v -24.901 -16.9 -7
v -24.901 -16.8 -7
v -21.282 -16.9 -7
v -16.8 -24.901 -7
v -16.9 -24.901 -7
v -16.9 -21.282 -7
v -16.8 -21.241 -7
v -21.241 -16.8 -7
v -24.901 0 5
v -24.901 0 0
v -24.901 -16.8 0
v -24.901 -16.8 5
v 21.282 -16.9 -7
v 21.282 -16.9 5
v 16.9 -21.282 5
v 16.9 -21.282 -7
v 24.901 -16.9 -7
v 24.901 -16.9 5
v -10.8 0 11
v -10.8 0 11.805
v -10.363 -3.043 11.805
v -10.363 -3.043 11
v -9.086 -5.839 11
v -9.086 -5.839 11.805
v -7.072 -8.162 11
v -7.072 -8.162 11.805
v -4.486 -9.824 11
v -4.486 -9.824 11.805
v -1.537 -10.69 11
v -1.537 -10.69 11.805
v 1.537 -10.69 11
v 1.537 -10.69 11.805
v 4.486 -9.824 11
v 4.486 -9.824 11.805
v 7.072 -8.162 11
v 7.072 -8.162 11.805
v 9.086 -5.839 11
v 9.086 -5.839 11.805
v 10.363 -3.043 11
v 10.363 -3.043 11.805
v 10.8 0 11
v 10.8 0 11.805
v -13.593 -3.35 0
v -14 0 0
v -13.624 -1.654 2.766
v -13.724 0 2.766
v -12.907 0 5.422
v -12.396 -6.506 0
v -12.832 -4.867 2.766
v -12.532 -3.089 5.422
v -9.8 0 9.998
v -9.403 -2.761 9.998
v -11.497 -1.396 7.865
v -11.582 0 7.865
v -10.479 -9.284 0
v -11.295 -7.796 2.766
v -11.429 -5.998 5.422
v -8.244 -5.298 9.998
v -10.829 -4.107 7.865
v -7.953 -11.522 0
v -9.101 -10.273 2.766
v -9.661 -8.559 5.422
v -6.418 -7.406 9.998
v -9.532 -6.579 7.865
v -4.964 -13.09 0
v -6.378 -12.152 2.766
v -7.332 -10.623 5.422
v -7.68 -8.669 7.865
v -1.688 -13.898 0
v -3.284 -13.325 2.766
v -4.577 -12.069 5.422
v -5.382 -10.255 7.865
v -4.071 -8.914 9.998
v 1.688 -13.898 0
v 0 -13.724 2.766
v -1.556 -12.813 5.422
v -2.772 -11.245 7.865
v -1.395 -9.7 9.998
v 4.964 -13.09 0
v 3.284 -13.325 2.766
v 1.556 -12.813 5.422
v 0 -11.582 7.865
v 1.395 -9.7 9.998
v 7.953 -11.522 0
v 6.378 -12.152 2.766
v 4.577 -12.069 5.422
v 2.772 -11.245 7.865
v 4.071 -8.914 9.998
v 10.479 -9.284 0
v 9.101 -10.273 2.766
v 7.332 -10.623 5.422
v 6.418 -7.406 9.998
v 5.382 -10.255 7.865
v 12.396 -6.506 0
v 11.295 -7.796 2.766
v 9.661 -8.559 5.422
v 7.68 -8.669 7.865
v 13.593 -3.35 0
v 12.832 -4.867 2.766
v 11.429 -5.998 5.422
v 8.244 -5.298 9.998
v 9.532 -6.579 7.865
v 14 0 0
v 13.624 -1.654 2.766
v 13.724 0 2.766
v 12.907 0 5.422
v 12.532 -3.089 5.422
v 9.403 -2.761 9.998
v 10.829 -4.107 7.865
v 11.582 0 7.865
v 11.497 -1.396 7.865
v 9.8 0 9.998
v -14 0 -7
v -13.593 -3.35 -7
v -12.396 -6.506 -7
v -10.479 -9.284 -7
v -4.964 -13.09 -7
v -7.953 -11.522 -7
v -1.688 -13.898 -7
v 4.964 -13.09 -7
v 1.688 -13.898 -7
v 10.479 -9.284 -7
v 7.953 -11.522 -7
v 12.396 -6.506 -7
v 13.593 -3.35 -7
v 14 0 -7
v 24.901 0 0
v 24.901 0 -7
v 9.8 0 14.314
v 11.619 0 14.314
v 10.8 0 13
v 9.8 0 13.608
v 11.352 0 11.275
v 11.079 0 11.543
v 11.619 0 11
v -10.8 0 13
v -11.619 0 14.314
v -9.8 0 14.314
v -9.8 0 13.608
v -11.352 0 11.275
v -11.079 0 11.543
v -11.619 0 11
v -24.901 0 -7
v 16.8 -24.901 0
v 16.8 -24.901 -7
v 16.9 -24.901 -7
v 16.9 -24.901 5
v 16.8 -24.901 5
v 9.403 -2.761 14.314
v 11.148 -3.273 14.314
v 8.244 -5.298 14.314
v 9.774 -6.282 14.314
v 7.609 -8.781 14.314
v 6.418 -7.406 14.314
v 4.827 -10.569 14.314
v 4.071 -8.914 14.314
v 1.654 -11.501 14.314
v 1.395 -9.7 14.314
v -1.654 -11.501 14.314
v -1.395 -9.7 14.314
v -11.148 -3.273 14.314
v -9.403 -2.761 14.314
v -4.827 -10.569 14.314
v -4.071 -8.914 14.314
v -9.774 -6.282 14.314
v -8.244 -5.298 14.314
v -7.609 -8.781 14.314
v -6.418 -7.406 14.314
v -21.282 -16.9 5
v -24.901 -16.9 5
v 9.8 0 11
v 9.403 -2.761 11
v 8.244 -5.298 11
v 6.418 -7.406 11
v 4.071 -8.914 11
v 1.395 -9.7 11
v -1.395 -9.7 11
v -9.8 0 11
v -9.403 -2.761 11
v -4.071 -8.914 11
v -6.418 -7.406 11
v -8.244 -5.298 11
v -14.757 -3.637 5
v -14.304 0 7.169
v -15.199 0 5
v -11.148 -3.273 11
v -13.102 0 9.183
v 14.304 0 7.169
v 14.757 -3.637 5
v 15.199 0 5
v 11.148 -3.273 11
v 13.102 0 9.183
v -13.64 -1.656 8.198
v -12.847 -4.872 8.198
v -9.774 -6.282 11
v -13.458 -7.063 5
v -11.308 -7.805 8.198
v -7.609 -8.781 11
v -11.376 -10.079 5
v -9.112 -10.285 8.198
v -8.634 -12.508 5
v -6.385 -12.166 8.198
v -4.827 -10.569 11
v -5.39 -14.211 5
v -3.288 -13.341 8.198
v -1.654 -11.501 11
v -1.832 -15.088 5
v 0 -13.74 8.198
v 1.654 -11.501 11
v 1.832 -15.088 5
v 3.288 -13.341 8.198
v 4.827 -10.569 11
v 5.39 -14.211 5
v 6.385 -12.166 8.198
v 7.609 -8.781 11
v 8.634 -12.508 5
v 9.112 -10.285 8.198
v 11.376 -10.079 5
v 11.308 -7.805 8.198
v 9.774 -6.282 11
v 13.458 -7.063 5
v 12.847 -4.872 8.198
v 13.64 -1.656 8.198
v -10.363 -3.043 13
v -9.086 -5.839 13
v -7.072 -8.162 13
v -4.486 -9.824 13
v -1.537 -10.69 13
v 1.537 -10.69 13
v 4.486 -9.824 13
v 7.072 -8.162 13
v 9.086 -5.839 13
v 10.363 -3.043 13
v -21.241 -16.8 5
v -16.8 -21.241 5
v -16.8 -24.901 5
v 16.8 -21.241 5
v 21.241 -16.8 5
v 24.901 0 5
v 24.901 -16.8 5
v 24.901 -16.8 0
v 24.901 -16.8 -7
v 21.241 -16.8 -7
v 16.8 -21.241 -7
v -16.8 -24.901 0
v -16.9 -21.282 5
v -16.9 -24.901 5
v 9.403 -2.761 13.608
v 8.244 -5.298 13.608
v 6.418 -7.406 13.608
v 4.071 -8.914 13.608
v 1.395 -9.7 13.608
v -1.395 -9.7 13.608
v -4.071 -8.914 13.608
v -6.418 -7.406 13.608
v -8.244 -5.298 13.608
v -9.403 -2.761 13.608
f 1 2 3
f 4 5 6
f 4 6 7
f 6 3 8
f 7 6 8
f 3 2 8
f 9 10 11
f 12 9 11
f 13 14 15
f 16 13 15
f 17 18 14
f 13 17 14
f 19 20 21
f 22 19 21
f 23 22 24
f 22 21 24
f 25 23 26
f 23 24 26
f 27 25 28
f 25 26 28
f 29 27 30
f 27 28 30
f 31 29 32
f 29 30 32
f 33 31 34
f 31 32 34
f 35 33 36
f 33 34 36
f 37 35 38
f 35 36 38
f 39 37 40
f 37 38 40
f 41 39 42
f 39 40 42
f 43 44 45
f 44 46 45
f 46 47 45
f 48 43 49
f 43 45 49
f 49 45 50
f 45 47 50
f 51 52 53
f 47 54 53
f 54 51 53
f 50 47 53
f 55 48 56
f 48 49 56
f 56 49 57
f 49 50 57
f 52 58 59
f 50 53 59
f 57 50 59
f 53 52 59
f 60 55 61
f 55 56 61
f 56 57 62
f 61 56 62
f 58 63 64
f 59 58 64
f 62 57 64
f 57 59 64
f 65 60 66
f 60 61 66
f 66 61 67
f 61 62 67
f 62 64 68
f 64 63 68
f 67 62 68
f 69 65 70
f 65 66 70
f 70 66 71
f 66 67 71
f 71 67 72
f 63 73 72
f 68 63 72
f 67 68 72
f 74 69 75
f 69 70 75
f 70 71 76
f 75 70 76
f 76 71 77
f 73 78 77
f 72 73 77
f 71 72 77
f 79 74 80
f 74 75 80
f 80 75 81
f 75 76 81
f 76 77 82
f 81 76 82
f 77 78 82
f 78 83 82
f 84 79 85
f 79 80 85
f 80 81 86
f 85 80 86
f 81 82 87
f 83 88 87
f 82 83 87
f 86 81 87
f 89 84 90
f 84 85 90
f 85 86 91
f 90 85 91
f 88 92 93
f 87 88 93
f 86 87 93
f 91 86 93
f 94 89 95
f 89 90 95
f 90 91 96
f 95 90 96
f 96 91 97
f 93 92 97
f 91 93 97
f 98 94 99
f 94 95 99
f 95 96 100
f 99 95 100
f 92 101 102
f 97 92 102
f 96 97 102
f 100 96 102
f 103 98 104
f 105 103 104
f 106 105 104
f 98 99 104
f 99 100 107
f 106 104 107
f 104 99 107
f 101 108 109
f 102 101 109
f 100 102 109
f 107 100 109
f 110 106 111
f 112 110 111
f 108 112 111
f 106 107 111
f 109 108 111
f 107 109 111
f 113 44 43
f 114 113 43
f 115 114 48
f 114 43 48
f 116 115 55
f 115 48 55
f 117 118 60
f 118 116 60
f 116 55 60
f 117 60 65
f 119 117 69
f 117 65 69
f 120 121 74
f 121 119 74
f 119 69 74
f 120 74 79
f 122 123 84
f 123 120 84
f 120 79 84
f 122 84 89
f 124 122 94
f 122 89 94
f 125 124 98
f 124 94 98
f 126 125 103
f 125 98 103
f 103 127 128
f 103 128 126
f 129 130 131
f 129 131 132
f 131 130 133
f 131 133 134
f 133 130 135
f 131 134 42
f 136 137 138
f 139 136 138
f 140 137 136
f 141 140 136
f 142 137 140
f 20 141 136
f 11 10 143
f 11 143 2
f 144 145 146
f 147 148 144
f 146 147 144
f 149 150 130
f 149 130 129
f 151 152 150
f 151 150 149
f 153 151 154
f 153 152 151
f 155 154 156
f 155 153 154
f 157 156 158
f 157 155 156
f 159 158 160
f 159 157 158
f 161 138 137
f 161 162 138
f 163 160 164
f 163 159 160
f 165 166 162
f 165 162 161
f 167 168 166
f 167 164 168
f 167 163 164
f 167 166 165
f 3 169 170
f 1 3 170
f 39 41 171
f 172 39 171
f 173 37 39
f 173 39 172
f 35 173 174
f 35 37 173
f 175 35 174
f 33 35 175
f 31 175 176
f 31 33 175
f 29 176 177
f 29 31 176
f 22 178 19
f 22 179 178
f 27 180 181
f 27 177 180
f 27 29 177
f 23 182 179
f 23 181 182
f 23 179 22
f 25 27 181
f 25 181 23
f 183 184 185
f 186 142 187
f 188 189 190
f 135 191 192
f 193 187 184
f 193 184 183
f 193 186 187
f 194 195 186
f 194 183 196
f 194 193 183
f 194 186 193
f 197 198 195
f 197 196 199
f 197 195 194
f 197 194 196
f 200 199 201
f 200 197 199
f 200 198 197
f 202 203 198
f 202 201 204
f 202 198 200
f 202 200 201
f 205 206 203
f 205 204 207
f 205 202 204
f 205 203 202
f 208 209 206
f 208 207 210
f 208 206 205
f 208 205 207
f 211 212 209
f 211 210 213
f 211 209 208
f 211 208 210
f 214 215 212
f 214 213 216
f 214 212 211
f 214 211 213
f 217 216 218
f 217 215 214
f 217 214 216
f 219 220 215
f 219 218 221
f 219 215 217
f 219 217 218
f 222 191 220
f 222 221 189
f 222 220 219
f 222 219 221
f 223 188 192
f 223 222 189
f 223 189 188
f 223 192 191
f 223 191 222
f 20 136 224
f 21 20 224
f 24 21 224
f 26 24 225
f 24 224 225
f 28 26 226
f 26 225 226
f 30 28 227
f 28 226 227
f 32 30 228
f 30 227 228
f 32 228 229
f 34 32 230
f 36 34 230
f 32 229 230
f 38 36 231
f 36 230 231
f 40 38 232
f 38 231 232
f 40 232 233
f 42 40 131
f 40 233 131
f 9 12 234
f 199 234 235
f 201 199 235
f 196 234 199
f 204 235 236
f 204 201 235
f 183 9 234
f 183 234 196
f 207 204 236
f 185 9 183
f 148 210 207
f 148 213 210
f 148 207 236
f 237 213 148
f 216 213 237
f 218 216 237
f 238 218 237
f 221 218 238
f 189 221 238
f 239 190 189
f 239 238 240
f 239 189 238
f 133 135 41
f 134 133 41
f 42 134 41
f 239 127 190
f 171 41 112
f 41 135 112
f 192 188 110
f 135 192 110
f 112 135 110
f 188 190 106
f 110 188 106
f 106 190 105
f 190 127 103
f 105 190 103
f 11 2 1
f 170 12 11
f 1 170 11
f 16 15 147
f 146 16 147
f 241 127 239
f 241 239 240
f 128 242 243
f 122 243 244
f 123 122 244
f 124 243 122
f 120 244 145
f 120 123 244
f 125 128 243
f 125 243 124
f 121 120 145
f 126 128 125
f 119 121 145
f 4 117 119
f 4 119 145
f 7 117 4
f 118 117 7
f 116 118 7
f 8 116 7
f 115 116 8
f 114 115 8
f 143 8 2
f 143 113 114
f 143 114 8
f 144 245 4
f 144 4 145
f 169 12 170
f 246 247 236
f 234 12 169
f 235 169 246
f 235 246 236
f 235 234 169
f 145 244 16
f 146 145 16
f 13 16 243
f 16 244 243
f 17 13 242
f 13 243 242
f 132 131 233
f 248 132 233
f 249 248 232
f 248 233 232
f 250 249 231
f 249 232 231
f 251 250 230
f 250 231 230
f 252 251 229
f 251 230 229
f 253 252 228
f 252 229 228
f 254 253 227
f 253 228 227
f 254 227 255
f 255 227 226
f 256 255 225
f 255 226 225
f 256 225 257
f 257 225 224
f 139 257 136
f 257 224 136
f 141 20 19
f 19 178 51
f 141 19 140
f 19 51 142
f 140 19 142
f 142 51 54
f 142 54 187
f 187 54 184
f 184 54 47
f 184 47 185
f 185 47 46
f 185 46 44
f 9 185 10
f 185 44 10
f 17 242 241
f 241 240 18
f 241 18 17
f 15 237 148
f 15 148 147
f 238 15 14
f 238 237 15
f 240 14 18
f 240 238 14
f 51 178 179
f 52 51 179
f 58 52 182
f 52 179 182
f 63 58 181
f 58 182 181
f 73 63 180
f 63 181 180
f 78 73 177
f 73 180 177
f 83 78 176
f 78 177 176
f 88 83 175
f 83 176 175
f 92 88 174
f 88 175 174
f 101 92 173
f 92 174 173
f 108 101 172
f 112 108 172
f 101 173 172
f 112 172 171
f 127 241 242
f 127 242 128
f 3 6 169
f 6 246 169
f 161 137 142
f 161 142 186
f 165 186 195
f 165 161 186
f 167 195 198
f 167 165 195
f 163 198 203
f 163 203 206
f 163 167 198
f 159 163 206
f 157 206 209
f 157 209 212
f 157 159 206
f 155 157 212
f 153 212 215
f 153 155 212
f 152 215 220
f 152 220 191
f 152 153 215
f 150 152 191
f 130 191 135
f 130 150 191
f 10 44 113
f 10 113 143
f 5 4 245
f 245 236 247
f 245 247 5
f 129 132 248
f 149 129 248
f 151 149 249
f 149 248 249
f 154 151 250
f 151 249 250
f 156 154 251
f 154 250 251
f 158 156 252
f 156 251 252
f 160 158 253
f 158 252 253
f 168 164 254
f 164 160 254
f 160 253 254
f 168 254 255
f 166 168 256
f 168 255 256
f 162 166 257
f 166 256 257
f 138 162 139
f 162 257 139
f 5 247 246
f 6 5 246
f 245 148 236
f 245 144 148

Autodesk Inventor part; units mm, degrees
ref_plane "YZ Plane" through (0, 0, 0) normal (1, 0, 0) x (0, 1, 0)
ref_plane "XZ Plane" through (0, 0, 0) normal (0, 1, 0) x (-1, 0, 0)
sketch "Sketch1" plane through (0, 0, 0) normal (0, 0, 1) x (1, 0, 0)
  line L0 (-36.8533, 0) -> (46.8153, 0) construction
  line L1 (0, -29.8808) -> (0, 4.9801) construction
  line L2 (0, 0) -> (24.6516, -24.6516) construction
  line L3 (0, 0) -> (34.8626, 0) construction
  line L4 (0, -24.9006) -> (16.8, -24.9006)
  line L5 (16.8, -24.9006) -> (16.8, -21.2406)
  line L6 (16.8, -21.2406) -> (19.0203, -19.0203)
  line L7 (24.9006, 0) -> (24.9006, -16.8)
  line L8 (24.9006, -16.8) -> (21.2406, -16.8)
  line L9 (21.2406, -16.8) -> (19.0203, -19.0203)
  line L10 (0, 0) -> (-24.6516, -24.6516) construction
  line L11 (0, -24.9006) -> (-16.8, -24.9006)
  line L12 (-16.8, -24.9006) -> (-16.8, -21.2406)
  line L13 (-16.8, -21.2406) -> (-19.0203, -19.0203)
  line L14 (-24.9006, 0) -> (-24.9006, -16.8)
  line L15 (-24.9006, -16.8) -> (-21.2406, -16.8)
  line L16 (-21.2406, -16.8) -> (-19.0203, -19.0203)
  arc A0 (-14, 0) -> (14, 0) centre (0, 0) ccw
  line L17 (0, 0) -> (14, 0) construction
  line L18 (0, 0) -> (-14, 0) construction
  line L19 (-14, 0) -> (-24.9006, 0)
  line L20 (14, 0) -> (24.9006, 0)
  dimension "d0" = 45
  dimension "d1" = 16.8
  dimension "d2" = 3.66
  dimension "d4" = 3.14
  dimension "d5" = 14
  dimension "d6" = 180
extrude "Extrusion1" add sketch "Sketch1" along normal blind 5
sketch "Sketch3" plane through (-24.9006, 0, 0) normal (0, 1, 0) x (1, 0, 0)
  line L0 (10.9006, 0) -> (0, 0) construction
  line L1 (0, 0) -> (0, -5) construction
  line L2 (10.9006, -5) -> (0, -5) construction
  line L3 (10.9006, 0) -> (10.9006, -5) construction
  line L4 (38.9006, 0) -> (10.9006, 0) construction
  line L5 (10.9006, 0) -> (10.9006, -5) construction
  line L6 (38.9006, -5) -> (10.9006, -5) construction
  line L7 (38.9006, 0) -> (38.9006, -5) construction
  line L8 (49.8013, 0) -> (38.9006, 0) construction
  line L9 (38.9006, 0) -> (38.9006, -5) construction
  line L10 (49.8013, -5) -> (38.9006, -5) construction
  line L11 (49.8013, 0) -> (49.8013, -5) construction
  line L12 (24.9006, 18.5006) -> (24.9006, -23.5037) construction
  arc A0 (10.9006, 0) -> (24.9006, -14) centre (24.9006, 0) ccw
  arc A1 (8.9006, 0) -> (24.9006, -16) centre (24.9006, 0) ccw
  line L13 (24.9006, -16) -> (24.9006, -14)
  line L14 (10.9006, 0) -> (0, 0) projected
  line L15 (8.9006, 0) -> (10.9006, 0)
  dimension "d11" = 2
revolve "Revolution2" add sketch "Sketch3" angle 180 about axis through (0, 0, -10) along (0, 0, 1)
ref_plane "Work Plane1" through (0, 0, 16) normal (0, 0, 1) x (1, 0, 0)
sketch "Sketch5" plane through (24.9006, 0, 5) normal (0, 1, 0) x (1, 0, 0)
  line L0 (0, 0) -> (-9.7019, 0) construction
  line L1 (0, 5) -> (0, 0) construction
  line L2 (0, 5) -> (-10.9006, 5) construction
  arc A0 (-38.9006, 5) -> (-10.9006, 5) centre (-24.9006, 5) ccw construction
  line L3 (-38.9006, 5) -> (-49.8013, 5) construction
  line L4 (-49.8013, 5) -> (-49.8013, 0) construction
  line L5 (-40.0993, 0) -> (-49.8013, 0) construction
  arc A1 (-40.0993, 0) -> (-9.7019, 0) centre (-24.9006, 5) ccw construction
  arc A2 (-38.9006, 5) -> (-10.9006, 5) centre (-24.9006, 5) ccw construction
  line L6 (-10.9006, 5) -> (-38.9006, 5) construction
  line L7 (-24.9006, 25) -> (-24.9006, -17) construction
  line L8 (-24.9006, -6) -> (-35.7006, -6)
  line L9 (-35.7006, -6) -> (-35.7006, -8.1)
  line L10 (-35.7006, -8.1) -> (-24.9006, -8.1)
  line L11 (-24.9006, -8.1) -> (-24.9006, -6)
  arc A3 (-10.9006, 5) -> (-38.9006, 5) centre (-24.9006, 5) ccw construction
  line L12 (-24.9006, 19) -> (-24.9006, -6) construction
  line L13 (-24.9006, 19) -> (0.0994, 19) construction
  line L14 (-34.7006, -6) -> (-33.5609, -6)
  line L15 (-33.5609, -6) -> (-33.5609, -4.998)
  line L16 (-33.5609, -4.998) -> (-34.7006, -4.998)
  line L17 (-34.7006, -4.998) -> (-34.7006, -6)
  arc A4 (-38.9006, 5) -> (-10.9006, 5) centre (-24.9006, 5) ccw projected
  line L18 (-24.9006, -8.1) -> (-34.087, -8.1)
  line L19 (-34.087, -8.1) -> (-34.087, -11)
  line L20 (-34.087, -11) -> (-24.9006, -11)
  line L21 (-24.9006, -11) -> (-24.9006, -8.1)
  arc A5 (-40.0993, 0) -> (-9.7019, 0) centre (-24.9006, 5) ccw projected
  dimension "d16" = 10.8
  dimension "d17" = 2.1
  dimension "d19" = 25
  dimension "d20" = 90
  dimension "d21" = 1
revolve "Revolution3" cut sketch "Sketch5" angle 360 about axis through (0, 0, -10) along (0, 0, 1) contours L11 L10 A4 L8 | A4 L10 A5 L9 L8 | L8 L17 A4 | L21 A4 L10 | A4 L21 A5 L10 | L10 L9 A5
sketch "Sketch6" plane through (-24.9006, 0, 5) normal (0, 1, 0) x (1, 0, 0)
  line L0 (14.1006, -6.8051) -> (14.1006, -6) construction
  line L1 (14.1006, -6) -> (15.1006, -6) construction
  line L2 (15.1006, -6) -> (15.1006, -4.998) construction
  arc A0 (10.9006, 5) -> (15.1006, -4.998) centre (24.9006, 5) ccw construction
  line L3 (10.9006, 5) -> (0, 5) construction
  line L4 (0, 5) -> (0, 0) construction
  line L5 (9.7019, 0) -> (0, 0) construction
  arc A1 (9.7019, 0) -> (14.1006, -6.8051) centre (24.9006, 5) ccw construction
  line L6 (24.9006, 7.4176) -> (24.9006, -9.5058) construction
  arc A2 (9.7019, 0) -> (14.1006, -6.8051) centre (24.9006, 5) ccw projected
  line L7 (13.2817, -6) -> (13.2817, -9.314)
  line L8 (14.1006, -6) -> (24.9006, -6) construction
  line L9 (24.9006, -6) -> (24.9006, -8) construction
  line L10 (24.9006, -8) -> (14.1006, -8) construction
  line L11 (14.1006, -8) -> (14.1006, -6) construction
  line L12 (35.7006, -6) -> (14.1006, -6) construction
  line L13 (14.1006, -6) -> (24.9006, -6) construction
  line L14 (24.9006, -6) -> (24.9006, -11.2) construction
  line L15 (24.9006, -11.2) -> (14.1006, -11.2) construction
  line L16 (14.1006, -11.2) -> (14.1006, -6) construction
  arc A3 (14.1006, -8) -> (24.9006, -11.2) centre (24.9006, 8.625) ccw construction
  line L17 (14.1006, -6.8051) -> (14.1006, -8)
  line L18 (13.2817, -9.314) -> (15.1006, -9.314)
  line L19 (15.1006, -9.314) -> (15.1006, -8.6084)
  line L20 (15.1006, -8.6084) -> (14.1006, -8)
  line L21 (13.2817, -6) -> (14.1006, -6)
  line L22 (35.7006, -6.8051) -> (14.1006, -6.8051) projected
  line L23 (14.1006, -6.8051) -> (14.1006, -6)
  dimension "d23" = 2
  dimension "d24" = 5.2
revolve "Revolution4" add sketch "Sketch6" angle 180 about axis through (0, 0, -10) along (0, 0, 1) contours A2 L17 L20 L19 L18 L7
sketch "Sketch7" plane through (0, 0, 0) normal (0, 0, -1) x (-1, 0, 0)
  line L0 (-24.9006, 0) -> (-14, 0) projected
  line L1 (-24.9006, -16.8) -> (-24.9006, 0) projected
  line L2 (-21.2406, -16.8) -> (-24.9006, -16.8) projected
  line L3 (-16.8, -21.2406) -> (-21.2406, -16.8) projected
  line L4 (-16.8, -24.9006) -> (-16.8, -21.2406) projected
  line L5 (16.8, -24.9006) -> (-16.8, -24.9006) projected
  line L6 (16.8, -21.2406) -> (16.8, -24.9006) projected
  line L7 (21.2406, -16.8) -> (16.8, -21.2406) projected
  line L8 (24.9006, -16.8) -> (21.2406, -16.8) projected
  line L9 (24.9006, 0) -> (24.9006, -16.8) projected
  line L10 (14, 0) -> (24.9006, 0) projected
  arc A0 (-14, 0) -> (14, 0) centre (0, 0) ccw projected
extrude "Extrusion3" add sketch "Sketch7" along normal blind 7
sketch "Skizze8" plane through (0, 0, 5) normal (0, 0, 1) x (1, 0, 0)
  arc A0 (-15.1987, 0) -> (15.1987, 0) centre (0, 0) ccw construction
  line L0 (-15.1987, 0) -> (-24.9006, 0) construction
  line L1 (-24.9006, 0) -> (-24.9006, -16.8) construction
  line L2 (-24.9006, -16.8) -> (-21.2406, -16.8) projected
  line L3 (-21.2406, -16.8) -> (-16.8, -21.2406) projected
  line L4 (-16.8, -21.2406) -> (-16.8, -24.9006) projected
  line L5 (-16.8, -24.9006) -> (16.8, -24.9006) construction
  line L6 (16.8, -24.9006) -> (16.8, -21.2406) projected
  line L7 (16.8, -21.2406) -> (21.2406, -16.8) projected
  line L8 (21.2406, -16.8) -> (24.9006, -16.8) projected
  line L9 (24.9006, -16.8) -> (24.9006, 0) construction
  line L10 (24.9006, 0) -> (15.1987, 0) construction
  line L11 (25.0006, 0.1) -> (25.0006, -16.9) construction
  line L12 (25.0006, -16.9) -> (21.2821, -16.9)
  line L13 (21.2821, -16.9) -> (16.9, -21.2821)
  line L14 (16.9, -21.2821) -> (16.9, -25.0006)
  line L15 (16.9, -25.0006) -> (-16.9, -25.0006) construction
  line L16 (-16.9, -25.0006) -> (-16.9, -21.2821)
  line L17 (-16.9, -21.2821) -> (-21.2821, -16.9)
  line L18 (-21.2821, -16.9) -> (-25.0006, -16.9)
  line L19 (-25.0006, -16.9) -> (-25.0006, 0.1) construction
  line L20 (-25.0006, 0.1) -> (-15.0984, 0.1) construction
  arc A1 (-15.0984, 0.1) -> (15.0984, 0.1) centre (0, 0) ccw construction
  line L21 (15.0984, 0.1) -> (25.0006, 0.1) construction
  line L22 (-24.9006, -16.8) -> (-24.9006, -16.9)
  line L23 (-16.8, -24.9006) -> (-16.9, -24.9006)
  line L24 (16.8, -24.9006) -> (-16.8, -24.9006) projected
  line L25 (16.8, -24.9006) -> (16.9, -24.9006)
  line L26 (24.9006, 0) -> (24.9006, -16.8) projected
  line L27 (24.9006, -16.8) -> (24.9006, -16.9)
  point P0 (0, 0)
  dimension "d0" = 45
  dimension "d1" = 16.8
  dimension "d2" = 3.66
  dimension "d4" = 3.14
  dimension "d5" = 14
  dimension "d6" = 180
  dimension "d28" = 0.1
extrude "IM_offset" add sketch "Skizze8" against normal up to surface (12 mm away)
properties part number "20_Cube_Insert_Eye_Lens_v3"
